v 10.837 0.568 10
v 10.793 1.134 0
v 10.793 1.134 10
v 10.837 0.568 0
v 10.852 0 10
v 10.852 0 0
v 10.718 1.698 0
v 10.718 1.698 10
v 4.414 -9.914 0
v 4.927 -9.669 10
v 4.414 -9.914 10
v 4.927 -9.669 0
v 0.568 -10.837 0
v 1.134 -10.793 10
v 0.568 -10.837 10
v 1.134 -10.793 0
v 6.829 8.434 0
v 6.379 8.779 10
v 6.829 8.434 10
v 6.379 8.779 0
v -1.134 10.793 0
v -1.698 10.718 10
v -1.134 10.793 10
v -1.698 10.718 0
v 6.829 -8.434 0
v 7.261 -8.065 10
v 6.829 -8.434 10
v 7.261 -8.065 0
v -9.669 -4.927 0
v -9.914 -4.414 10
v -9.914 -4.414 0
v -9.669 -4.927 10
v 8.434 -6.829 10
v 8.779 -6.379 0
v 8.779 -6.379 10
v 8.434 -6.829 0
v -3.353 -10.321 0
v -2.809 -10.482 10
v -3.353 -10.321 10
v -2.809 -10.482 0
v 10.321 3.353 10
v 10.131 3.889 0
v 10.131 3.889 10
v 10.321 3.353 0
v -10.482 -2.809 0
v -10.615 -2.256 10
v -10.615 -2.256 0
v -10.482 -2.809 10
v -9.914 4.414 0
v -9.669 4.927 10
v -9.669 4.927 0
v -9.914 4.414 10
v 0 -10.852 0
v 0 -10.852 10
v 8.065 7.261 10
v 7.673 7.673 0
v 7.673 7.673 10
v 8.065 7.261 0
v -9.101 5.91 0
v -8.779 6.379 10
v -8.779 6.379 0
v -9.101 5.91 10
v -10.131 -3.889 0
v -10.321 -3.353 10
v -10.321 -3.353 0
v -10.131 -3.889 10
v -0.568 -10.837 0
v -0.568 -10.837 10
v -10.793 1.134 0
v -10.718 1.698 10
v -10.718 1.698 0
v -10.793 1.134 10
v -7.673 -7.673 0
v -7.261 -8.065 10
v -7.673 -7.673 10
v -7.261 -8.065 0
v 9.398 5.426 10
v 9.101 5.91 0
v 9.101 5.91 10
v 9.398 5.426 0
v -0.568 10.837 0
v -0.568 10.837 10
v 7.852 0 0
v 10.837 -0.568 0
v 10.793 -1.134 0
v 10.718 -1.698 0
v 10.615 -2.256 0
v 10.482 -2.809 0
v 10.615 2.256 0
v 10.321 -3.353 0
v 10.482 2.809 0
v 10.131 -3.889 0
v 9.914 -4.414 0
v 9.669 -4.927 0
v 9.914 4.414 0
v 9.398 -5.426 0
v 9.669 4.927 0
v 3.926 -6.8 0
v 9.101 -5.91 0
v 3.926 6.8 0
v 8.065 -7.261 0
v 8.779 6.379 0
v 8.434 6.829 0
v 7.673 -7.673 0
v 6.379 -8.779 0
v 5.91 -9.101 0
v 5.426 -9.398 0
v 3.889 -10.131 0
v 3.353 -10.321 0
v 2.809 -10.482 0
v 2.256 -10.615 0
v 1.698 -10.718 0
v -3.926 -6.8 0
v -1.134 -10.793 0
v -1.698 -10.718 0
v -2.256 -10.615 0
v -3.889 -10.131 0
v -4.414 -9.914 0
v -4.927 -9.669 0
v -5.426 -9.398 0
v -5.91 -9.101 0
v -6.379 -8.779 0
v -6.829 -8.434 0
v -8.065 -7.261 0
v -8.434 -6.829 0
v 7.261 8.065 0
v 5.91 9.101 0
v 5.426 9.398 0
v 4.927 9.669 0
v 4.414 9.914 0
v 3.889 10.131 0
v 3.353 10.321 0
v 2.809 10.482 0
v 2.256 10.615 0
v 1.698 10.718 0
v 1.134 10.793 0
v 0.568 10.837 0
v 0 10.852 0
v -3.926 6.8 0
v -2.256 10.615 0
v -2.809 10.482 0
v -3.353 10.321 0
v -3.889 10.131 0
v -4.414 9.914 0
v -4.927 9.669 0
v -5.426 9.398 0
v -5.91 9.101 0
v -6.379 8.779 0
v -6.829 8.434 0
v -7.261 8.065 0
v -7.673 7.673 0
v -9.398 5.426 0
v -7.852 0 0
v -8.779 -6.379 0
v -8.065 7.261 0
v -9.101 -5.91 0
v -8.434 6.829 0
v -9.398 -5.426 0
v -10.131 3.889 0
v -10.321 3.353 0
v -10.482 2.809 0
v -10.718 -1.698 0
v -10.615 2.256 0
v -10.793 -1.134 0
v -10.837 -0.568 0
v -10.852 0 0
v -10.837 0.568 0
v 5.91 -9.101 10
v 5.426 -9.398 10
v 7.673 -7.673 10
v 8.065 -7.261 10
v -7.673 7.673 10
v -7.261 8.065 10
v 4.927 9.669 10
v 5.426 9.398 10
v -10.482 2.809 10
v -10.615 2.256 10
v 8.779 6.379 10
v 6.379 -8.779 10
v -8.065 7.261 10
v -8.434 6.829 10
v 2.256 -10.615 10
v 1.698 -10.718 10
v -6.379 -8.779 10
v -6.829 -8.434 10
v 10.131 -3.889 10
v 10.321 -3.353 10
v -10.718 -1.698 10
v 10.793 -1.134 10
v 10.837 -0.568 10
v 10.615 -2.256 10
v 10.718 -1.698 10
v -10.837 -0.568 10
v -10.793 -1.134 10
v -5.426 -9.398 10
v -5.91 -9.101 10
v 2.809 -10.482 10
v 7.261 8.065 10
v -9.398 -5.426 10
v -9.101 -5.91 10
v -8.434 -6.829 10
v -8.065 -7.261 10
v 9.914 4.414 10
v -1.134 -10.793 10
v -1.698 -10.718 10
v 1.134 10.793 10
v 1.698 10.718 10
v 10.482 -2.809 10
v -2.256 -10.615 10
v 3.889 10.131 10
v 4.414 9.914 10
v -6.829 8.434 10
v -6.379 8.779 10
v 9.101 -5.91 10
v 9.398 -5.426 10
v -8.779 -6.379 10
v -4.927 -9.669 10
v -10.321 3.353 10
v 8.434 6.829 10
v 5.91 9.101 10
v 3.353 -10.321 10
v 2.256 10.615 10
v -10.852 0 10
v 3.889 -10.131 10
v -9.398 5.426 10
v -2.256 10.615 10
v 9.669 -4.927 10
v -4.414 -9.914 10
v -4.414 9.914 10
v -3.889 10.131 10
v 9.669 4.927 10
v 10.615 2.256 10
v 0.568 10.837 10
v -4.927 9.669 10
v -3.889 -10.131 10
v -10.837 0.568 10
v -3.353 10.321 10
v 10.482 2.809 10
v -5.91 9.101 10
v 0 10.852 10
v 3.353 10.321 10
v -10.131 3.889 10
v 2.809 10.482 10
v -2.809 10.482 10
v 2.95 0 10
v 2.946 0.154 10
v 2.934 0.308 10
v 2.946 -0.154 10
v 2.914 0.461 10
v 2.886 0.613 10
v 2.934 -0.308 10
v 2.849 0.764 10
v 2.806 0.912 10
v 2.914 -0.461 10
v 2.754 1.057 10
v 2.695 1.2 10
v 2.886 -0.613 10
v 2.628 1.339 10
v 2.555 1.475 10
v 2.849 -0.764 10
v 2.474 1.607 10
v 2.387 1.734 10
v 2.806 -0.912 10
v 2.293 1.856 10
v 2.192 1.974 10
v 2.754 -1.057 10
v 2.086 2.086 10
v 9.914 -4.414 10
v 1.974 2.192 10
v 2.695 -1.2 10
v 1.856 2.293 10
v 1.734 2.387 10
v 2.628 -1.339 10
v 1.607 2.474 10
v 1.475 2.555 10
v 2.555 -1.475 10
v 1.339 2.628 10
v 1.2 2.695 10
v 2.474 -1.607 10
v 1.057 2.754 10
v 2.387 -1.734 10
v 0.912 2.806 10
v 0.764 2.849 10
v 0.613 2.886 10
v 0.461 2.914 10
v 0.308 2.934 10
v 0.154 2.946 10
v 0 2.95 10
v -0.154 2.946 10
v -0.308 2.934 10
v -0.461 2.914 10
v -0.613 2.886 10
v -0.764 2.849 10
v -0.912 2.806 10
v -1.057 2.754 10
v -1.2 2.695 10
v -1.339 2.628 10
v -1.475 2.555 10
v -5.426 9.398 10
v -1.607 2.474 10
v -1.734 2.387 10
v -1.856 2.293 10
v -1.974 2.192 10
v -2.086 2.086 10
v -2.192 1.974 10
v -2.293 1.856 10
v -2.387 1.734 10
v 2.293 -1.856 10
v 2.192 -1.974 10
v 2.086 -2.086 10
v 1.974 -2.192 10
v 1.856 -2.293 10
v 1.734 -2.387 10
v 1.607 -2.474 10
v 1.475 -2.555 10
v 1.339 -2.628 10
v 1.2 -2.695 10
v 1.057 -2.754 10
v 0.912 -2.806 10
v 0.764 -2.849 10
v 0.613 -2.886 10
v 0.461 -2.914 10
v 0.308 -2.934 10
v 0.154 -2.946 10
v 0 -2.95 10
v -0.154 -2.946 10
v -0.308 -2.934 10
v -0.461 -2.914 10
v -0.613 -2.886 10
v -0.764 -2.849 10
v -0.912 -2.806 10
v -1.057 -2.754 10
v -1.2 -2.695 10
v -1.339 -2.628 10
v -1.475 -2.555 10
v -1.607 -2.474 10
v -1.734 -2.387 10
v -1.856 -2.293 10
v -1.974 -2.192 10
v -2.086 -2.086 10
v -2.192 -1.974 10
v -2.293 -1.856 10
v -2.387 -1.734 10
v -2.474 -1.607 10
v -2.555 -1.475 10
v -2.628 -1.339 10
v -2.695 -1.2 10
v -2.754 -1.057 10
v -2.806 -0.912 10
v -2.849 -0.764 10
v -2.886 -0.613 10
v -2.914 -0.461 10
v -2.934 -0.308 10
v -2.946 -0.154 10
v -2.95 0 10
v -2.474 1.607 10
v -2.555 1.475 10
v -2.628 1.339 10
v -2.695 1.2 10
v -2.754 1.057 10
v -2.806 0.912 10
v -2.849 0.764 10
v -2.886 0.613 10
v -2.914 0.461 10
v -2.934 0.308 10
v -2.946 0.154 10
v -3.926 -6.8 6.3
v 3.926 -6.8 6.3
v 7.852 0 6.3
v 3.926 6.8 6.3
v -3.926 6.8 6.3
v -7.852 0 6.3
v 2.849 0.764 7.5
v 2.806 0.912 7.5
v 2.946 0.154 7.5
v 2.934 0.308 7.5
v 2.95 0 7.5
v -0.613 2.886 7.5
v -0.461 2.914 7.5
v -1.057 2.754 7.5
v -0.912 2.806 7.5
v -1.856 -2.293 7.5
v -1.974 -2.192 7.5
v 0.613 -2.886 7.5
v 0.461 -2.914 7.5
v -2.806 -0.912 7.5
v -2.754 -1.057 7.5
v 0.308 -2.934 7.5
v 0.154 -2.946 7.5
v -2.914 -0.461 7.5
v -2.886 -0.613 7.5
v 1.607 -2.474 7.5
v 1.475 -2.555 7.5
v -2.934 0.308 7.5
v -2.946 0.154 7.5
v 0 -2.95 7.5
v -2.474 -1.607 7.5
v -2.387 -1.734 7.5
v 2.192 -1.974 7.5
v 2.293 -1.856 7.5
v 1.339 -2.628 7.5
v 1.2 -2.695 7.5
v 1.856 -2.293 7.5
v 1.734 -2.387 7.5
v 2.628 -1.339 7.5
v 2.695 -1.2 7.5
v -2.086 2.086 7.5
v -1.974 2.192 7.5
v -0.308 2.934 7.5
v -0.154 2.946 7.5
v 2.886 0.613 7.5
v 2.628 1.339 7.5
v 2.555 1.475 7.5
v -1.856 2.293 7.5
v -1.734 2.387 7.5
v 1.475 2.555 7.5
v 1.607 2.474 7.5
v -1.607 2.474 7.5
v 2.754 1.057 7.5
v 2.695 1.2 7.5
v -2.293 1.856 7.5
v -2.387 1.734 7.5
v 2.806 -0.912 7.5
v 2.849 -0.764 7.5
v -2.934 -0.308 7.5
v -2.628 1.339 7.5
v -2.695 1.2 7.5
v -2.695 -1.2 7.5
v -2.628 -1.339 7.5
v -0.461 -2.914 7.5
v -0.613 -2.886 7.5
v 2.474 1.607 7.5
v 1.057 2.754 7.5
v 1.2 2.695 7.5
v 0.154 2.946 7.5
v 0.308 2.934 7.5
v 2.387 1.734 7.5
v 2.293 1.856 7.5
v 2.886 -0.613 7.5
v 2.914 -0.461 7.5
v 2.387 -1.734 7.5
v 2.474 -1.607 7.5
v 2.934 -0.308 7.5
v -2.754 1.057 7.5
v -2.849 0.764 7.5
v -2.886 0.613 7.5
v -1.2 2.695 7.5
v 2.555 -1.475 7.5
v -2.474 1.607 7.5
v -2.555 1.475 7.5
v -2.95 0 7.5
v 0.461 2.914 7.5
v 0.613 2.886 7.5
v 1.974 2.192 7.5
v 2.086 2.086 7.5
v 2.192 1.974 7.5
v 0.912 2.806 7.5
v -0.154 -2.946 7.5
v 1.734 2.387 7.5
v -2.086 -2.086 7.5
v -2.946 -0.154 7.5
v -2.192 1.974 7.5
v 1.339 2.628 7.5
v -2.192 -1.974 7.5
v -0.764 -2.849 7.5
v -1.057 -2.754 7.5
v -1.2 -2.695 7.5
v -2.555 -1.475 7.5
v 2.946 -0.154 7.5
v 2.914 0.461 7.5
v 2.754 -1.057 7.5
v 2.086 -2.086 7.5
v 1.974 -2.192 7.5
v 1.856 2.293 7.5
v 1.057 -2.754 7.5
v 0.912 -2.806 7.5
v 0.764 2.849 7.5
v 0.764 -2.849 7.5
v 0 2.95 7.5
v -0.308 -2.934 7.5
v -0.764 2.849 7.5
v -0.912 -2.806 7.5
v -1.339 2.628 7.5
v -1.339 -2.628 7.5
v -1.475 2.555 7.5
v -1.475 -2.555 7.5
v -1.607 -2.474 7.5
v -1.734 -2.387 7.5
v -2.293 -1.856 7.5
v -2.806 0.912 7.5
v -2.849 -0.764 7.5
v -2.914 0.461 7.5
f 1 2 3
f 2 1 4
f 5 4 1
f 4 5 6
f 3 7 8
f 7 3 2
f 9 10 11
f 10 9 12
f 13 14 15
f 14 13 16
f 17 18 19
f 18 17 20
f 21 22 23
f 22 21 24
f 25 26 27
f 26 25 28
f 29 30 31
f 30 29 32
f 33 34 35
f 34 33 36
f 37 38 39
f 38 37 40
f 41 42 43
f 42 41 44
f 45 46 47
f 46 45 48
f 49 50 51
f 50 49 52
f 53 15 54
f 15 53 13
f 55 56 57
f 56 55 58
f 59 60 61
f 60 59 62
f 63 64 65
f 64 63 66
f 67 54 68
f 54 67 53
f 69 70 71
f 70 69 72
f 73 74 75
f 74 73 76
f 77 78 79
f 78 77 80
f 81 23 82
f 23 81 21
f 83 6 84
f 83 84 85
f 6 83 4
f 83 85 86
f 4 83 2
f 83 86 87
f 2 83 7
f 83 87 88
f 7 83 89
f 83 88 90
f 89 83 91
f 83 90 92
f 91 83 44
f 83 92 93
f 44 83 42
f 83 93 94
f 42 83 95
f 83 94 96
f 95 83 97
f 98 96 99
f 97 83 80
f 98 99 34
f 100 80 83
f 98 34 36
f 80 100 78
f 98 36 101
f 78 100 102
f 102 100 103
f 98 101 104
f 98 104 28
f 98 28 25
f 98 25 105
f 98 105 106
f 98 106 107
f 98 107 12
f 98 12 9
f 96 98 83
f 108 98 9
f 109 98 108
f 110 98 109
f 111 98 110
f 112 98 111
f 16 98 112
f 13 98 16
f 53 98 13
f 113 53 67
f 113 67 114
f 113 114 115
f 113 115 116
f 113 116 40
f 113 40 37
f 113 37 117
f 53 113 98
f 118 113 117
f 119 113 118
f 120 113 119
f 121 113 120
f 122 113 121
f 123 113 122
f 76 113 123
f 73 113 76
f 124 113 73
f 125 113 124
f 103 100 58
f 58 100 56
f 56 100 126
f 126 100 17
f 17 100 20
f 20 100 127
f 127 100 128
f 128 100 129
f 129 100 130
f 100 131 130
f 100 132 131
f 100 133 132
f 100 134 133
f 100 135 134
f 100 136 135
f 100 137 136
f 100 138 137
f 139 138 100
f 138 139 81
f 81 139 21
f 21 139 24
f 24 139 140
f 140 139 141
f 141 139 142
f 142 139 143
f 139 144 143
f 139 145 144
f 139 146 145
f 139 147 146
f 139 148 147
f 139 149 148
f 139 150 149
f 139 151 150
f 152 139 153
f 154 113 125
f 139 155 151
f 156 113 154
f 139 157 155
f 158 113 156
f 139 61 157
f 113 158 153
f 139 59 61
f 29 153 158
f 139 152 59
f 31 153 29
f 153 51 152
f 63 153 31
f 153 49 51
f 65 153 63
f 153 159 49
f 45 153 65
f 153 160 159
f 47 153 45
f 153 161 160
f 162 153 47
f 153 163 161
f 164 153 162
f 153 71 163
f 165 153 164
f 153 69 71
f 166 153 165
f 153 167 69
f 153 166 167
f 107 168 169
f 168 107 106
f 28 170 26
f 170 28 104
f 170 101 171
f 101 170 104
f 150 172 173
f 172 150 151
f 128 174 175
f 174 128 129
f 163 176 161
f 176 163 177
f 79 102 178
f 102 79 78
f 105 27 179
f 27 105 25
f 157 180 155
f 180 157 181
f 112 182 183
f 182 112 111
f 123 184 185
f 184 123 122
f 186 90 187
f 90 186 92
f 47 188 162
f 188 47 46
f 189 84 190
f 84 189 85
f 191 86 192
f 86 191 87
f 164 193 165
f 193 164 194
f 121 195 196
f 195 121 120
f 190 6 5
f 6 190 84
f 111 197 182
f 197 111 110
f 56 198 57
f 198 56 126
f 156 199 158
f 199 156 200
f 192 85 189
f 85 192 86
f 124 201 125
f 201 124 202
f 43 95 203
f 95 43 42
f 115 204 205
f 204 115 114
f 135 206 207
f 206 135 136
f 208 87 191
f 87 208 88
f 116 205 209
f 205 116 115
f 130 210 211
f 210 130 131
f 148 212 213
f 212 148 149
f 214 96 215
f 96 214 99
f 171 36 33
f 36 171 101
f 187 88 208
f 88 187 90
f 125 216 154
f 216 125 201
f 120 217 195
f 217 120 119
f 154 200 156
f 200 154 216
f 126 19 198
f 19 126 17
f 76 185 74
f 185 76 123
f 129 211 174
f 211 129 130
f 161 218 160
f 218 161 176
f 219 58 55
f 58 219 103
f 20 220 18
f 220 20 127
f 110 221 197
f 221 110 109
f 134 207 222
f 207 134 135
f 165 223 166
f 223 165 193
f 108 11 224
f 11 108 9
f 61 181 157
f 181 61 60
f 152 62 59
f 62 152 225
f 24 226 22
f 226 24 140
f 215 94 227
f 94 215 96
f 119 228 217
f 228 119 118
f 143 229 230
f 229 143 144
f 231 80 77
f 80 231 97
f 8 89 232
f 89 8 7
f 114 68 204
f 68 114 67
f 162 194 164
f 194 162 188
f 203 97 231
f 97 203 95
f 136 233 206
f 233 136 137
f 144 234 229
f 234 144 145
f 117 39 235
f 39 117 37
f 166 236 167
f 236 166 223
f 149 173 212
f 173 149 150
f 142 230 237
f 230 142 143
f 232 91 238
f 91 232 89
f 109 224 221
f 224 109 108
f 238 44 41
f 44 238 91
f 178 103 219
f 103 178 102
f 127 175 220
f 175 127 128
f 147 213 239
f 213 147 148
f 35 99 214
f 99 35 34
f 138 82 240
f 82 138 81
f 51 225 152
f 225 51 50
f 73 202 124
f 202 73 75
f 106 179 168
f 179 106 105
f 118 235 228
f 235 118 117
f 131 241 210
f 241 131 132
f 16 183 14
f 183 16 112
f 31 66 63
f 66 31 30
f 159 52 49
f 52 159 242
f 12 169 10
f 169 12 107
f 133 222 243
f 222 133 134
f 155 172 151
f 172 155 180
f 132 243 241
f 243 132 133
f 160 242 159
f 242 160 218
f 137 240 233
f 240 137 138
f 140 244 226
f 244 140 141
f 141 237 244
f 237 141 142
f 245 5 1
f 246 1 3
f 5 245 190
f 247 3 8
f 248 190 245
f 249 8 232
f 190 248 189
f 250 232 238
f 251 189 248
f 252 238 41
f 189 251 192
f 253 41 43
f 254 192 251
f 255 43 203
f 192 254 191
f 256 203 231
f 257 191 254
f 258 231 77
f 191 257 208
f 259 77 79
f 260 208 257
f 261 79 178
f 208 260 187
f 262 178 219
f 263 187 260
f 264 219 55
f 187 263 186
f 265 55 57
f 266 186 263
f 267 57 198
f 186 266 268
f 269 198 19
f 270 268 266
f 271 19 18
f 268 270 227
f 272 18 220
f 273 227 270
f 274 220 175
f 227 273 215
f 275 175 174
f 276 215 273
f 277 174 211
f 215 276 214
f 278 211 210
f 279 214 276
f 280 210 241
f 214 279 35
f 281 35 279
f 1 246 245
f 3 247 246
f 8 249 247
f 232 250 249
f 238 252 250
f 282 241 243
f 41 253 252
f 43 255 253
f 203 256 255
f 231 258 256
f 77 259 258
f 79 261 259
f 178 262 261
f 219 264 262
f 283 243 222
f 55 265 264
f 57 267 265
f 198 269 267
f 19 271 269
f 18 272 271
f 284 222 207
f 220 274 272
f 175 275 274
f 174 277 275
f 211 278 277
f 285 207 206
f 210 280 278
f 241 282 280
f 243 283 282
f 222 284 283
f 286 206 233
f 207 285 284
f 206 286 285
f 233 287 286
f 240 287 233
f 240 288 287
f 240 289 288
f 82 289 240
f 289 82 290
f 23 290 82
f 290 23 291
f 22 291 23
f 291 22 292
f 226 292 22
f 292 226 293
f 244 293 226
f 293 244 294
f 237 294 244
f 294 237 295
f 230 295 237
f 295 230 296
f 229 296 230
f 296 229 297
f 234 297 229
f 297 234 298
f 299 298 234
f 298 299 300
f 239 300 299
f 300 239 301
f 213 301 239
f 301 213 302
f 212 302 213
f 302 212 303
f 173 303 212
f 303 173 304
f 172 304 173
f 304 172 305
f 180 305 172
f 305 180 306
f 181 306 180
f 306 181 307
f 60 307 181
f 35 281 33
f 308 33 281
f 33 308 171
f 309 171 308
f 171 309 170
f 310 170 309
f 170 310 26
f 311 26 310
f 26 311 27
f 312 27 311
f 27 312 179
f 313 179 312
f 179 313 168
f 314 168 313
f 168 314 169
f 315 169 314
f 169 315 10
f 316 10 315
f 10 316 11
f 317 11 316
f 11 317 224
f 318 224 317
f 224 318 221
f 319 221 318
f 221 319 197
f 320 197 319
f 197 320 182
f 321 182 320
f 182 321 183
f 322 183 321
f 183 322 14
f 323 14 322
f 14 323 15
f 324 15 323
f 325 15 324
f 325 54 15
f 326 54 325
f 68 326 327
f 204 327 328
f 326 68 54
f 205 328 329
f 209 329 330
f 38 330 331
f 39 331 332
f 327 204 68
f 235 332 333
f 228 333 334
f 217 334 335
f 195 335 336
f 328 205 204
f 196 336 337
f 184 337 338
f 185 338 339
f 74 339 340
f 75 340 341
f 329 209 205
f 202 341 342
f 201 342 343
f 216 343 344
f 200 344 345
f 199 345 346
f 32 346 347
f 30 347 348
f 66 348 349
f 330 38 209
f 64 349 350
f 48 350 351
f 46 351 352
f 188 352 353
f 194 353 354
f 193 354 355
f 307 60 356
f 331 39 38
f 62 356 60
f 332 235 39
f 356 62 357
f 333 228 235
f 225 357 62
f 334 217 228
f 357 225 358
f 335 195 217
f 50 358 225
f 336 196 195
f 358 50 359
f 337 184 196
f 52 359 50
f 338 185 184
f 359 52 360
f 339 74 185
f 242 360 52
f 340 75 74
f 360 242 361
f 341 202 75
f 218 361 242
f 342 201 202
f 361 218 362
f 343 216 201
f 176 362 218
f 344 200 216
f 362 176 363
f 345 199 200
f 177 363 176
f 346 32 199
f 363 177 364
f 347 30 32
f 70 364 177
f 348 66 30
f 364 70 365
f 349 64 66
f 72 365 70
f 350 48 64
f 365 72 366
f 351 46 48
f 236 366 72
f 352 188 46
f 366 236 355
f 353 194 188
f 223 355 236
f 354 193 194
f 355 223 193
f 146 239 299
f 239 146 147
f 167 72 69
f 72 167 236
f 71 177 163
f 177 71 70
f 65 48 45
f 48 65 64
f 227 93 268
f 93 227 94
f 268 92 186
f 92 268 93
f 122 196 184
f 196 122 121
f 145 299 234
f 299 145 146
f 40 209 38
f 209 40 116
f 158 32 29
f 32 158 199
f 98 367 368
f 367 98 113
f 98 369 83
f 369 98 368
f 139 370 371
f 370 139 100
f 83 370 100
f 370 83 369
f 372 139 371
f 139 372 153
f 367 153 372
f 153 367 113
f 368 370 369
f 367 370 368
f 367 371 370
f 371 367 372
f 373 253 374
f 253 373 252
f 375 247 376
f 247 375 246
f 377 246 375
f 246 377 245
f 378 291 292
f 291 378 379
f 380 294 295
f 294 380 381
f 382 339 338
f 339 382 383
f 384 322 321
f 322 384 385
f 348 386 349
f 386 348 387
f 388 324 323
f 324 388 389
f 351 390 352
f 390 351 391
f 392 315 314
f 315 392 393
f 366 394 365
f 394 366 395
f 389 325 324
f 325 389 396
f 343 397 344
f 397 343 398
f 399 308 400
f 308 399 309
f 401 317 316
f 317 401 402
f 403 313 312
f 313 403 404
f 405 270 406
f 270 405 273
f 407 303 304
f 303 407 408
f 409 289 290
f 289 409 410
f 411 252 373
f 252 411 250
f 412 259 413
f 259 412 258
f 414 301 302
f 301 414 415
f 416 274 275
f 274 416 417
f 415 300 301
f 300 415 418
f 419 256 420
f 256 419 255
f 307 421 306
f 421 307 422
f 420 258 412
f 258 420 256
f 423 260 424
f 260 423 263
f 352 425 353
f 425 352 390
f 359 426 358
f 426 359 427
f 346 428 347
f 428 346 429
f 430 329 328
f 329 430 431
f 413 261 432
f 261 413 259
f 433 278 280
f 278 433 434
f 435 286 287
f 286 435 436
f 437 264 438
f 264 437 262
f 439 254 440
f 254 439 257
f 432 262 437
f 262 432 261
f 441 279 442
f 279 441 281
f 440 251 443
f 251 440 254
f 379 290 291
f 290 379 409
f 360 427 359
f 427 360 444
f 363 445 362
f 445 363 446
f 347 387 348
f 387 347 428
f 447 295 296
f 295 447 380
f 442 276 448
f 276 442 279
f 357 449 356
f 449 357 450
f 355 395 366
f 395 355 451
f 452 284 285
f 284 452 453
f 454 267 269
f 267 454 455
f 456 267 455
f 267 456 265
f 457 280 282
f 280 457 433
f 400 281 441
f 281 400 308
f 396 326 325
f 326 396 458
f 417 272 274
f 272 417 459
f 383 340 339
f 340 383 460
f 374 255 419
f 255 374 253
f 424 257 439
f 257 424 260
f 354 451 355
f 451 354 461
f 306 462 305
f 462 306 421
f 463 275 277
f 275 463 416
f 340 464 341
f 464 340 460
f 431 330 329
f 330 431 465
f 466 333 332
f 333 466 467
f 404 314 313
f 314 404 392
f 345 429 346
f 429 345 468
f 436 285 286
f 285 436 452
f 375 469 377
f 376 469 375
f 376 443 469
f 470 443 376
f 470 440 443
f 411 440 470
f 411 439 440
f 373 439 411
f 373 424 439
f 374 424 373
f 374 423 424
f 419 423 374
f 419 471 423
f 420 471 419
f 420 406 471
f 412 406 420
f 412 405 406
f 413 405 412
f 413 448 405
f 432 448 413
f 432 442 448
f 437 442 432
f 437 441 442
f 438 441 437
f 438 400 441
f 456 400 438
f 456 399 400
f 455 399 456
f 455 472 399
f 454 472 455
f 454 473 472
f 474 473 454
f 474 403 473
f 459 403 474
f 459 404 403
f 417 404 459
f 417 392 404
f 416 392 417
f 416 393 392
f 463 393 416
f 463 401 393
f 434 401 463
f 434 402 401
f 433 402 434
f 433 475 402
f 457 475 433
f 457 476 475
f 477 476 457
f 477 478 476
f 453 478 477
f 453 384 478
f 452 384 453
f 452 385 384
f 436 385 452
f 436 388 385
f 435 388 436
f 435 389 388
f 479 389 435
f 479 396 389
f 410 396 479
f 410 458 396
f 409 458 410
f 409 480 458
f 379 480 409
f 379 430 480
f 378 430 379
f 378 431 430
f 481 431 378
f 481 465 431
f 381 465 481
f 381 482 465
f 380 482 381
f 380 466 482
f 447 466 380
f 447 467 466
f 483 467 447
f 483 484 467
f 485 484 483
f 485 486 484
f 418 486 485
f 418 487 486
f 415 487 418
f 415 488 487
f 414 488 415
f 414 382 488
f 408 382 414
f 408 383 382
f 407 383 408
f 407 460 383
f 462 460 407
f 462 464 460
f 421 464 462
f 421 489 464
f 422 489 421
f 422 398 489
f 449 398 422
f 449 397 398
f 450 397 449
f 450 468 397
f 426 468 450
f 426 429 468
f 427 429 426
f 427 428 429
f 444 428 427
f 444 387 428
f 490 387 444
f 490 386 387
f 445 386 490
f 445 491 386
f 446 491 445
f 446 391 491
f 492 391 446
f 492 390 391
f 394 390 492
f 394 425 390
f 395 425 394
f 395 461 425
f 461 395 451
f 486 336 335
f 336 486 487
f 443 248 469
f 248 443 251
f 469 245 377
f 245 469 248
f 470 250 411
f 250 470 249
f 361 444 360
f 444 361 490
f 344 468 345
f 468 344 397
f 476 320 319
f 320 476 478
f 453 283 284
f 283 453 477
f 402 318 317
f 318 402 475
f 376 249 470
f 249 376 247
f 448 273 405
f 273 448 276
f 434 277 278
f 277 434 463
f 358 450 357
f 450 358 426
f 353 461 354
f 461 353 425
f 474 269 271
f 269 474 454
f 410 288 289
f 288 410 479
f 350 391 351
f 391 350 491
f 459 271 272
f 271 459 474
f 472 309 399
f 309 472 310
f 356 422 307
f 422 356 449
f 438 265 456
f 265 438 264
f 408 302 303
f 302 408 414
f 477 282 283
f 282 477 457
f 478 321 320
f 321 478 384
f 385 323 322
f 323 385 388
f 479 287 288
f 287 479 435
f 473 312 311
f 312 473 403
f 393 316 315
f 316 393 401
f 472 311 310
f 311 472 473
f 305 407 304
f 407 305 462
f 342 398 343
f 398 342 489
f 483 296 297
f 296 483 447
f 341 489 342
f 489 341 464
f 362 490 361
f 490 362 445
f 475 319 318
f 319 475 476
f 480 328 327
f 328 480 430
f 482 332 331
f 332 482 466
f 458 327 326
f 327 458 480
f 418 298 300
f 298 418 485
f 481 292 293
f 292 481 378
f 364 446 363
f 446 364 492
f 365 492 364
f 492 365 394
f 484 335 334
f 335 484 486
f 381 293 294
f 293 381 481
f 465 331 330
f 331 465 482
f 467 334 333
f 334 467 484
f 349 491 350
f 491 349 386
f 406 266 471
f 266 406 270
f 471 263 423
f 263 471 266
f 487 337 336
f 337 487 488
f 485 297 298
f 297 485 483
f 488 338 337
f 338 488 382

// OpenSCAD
// MRider — steering angle magnet cap
// ==================================
// A cap that drops over the kingpin bolt head and presents a diametrically
// magnetised magnet on the steering axis for an AS5600.
//
// WHY THIS PART EXISTS, AND WHY IT IS A CAP
//   ADR B wants the absolute angle measured LOAD-SIDE, so that gearbox backlash
//   and linkage slop show up as measured error instead of invisible bias. This
//   vehicle refused an end-mounted magnet three times — no motor rear stub, no
//   free drive output, no free steering output, every axis occupied. The kingpin
//   bolt is the first one that is free, and its head TURNS WITH THE ROAD WHEEL
//   (mark test, 2026-10-16), with about 100 mm of clear air above it.
//
// WHY IT REGISTERS ON THE HEX AND NOT ON THE BOSS
//   An AS5600 wants its magnet concentric with the die to about +-0.25 mm. A hex
//   socket locates on six formed flats and centres itself; the boss below may or
//   may not even rotate. Nothing is drilled, nothing is cut, and pulling the cap
//   off returns the vehicle to stock — which 02-mechanical 2.8 asks for.
//
//   Build:  openscad -o cap.stl steering_magnet_cap.scad
//
// Spec: docs/order-log.md #13 · Sensor: docs/order-log.md #5

/* [Measured on the vehicle] */
// Kingpin bolt head, across the flats, mm. THE ONE MEASUREMENT THIS NEEDS.
// 13.3 measured 2026-10-16 — an M8 head is 13.0 nominal, so this is M8 plus paint.
HEAD_AF      = 13.3;
// Height of the hex head, mm. NOT YET MEASURED — 5.3 is the ISO 4017 figure for
// M8 and is a placeholder. Caliper it before printing; too shallow and the cap
// rocks, too deep and it bottoms on the boss instead of seating on the head.
HEAD_H       = 5.3;
// Clear air above the head, mm. 100 measured — the sensor bracket is unconstrained.
HEAD_CLEAR   = 100.0;

/* [Magnet — DIAMETRICALLY magnetised, not axial] */
MAG_D        = 6.0;         // disc diameter, mm
MAG_T        = 2.5;         // disc thickness, mm
MAG_CLEAR    = -0.1;        // NEGATIVE = press fit
MAG_BACK     = 1.2;         // floor under the magnet, mm

/* [Cap] */
WALL         = 3.0;         // radial wall around the hex, mm
SOCKET_CLEAR = 0.3;         // added across flats so it slips on by hand
SEAT_EXTRA   = 1.0;         // socket deeper than the head, so it seats on the head

/* [Hidden] */
$fn = 120;
EPS = 0.01;

// ---- derived -------------------------------------------------------------
SOCK_AF = HEAD_AF + SOCKET_CLEAR;
SOCK_AC = SOCK_AF / cos(30);          // across corners
OD      = SOCK_AC + 2 * WALL;
SOCK_H  = HEAD_H + SEAT_EXTRA;
TOTAL_H = SOCK_H + MAG_BACK + MAG_T;

echo(str("socket across flats ", SOCK_AF, " mm"));
echo(str("cap outside Ø",        OD,      " mm"));
echo(str("cap height",           TOTAL_H, " mm"));
echo(str("magnet face sits ",    TOTAL_H - HEAD_H, " mm above the bolt head"));
echo(str("wall at the flats",    (OD - SOCK_AF)/2, " mm"));

assert(MAG_D < SOCK_AF,
       "magnet pocket is wider than the socket — its floor would have nothing to sit on");
assert(MAG_BACK >= 0.8, "floor under the magnet too thin to print");
assert(TOTAL_H < HEAD_CLEAR, "cap is taller than the room above the bolt head");
assert(SOCKET_CLEAR > 0, "socket must slip on by hand — this part is removed to return the vehicle to stock");

// ---- parts ---------------------------------------------------------------
module hex(af, h) { cylinder(d = af / cos(30), h = h, $fn = 6); }

module cap() {
    difference() {
        cylinder(d = OD, h = TOTAL_H);
        // hex socket, open at the bottom
        translate([0, 0, -EPS]) hex(SOCK_AF, SOCK_H + EPS);
        // magnet pocket, open at the top
        translate([0, 0, TOTAL_H - MAG_T])
            cylinder(d = MAG_D + MAG_CLEAR, h = MAG_T + EPS);
    }
}
cap();

// ---- printing ------------------------------------------------------------
// PETG, 0.2 mm layers, 4 perimeters, 40 % infill, no supports.
//
// PRINT IT MAGNET-FACE DOWN, socket opening upward. The floor under the magnet
// then bridges only the 6 mm pocket instead of the 13.6 mm socket, and the
// magnet face comes off the bed flat, which is the face the sensor reads across.
//
// ---- fitting -------------------------------------------------------------
// 1. CHECK THE BOLT SPINS RATHER THAN ORBITS. A mark on the head that turns on
//    the spot means the bolt is on the steering axis. A mark that travels in a
//    circle means it is offset, and this cap cannot work — say so before
//    printing.
// 2. Caliper HEAD_H and set it. The socket must bottom on nothing: it seats on
//    the hex, and SEAT_EXTRA keeps it off whatever is under the head.
// 3. Press the cap on by hand. It should need a push and come off with a pull.
//    No adhesive on the BOLT, ever — the cap comes off to return the vehicle to
//    stock. If it ever works loose, glue the magnet, not the cap.
// 4. Press the magnet in flush. A diametric magnet has its poles across the
//    disc, so which way round it goes does not matter: the AS5600's zero is
//    programmable and firmware carries the offset anyway.
// 5. The sensor faces the magnet across 0.5-3 mm, die centred on the axis,
//    on a bracket fixed to the CHASSIS.
